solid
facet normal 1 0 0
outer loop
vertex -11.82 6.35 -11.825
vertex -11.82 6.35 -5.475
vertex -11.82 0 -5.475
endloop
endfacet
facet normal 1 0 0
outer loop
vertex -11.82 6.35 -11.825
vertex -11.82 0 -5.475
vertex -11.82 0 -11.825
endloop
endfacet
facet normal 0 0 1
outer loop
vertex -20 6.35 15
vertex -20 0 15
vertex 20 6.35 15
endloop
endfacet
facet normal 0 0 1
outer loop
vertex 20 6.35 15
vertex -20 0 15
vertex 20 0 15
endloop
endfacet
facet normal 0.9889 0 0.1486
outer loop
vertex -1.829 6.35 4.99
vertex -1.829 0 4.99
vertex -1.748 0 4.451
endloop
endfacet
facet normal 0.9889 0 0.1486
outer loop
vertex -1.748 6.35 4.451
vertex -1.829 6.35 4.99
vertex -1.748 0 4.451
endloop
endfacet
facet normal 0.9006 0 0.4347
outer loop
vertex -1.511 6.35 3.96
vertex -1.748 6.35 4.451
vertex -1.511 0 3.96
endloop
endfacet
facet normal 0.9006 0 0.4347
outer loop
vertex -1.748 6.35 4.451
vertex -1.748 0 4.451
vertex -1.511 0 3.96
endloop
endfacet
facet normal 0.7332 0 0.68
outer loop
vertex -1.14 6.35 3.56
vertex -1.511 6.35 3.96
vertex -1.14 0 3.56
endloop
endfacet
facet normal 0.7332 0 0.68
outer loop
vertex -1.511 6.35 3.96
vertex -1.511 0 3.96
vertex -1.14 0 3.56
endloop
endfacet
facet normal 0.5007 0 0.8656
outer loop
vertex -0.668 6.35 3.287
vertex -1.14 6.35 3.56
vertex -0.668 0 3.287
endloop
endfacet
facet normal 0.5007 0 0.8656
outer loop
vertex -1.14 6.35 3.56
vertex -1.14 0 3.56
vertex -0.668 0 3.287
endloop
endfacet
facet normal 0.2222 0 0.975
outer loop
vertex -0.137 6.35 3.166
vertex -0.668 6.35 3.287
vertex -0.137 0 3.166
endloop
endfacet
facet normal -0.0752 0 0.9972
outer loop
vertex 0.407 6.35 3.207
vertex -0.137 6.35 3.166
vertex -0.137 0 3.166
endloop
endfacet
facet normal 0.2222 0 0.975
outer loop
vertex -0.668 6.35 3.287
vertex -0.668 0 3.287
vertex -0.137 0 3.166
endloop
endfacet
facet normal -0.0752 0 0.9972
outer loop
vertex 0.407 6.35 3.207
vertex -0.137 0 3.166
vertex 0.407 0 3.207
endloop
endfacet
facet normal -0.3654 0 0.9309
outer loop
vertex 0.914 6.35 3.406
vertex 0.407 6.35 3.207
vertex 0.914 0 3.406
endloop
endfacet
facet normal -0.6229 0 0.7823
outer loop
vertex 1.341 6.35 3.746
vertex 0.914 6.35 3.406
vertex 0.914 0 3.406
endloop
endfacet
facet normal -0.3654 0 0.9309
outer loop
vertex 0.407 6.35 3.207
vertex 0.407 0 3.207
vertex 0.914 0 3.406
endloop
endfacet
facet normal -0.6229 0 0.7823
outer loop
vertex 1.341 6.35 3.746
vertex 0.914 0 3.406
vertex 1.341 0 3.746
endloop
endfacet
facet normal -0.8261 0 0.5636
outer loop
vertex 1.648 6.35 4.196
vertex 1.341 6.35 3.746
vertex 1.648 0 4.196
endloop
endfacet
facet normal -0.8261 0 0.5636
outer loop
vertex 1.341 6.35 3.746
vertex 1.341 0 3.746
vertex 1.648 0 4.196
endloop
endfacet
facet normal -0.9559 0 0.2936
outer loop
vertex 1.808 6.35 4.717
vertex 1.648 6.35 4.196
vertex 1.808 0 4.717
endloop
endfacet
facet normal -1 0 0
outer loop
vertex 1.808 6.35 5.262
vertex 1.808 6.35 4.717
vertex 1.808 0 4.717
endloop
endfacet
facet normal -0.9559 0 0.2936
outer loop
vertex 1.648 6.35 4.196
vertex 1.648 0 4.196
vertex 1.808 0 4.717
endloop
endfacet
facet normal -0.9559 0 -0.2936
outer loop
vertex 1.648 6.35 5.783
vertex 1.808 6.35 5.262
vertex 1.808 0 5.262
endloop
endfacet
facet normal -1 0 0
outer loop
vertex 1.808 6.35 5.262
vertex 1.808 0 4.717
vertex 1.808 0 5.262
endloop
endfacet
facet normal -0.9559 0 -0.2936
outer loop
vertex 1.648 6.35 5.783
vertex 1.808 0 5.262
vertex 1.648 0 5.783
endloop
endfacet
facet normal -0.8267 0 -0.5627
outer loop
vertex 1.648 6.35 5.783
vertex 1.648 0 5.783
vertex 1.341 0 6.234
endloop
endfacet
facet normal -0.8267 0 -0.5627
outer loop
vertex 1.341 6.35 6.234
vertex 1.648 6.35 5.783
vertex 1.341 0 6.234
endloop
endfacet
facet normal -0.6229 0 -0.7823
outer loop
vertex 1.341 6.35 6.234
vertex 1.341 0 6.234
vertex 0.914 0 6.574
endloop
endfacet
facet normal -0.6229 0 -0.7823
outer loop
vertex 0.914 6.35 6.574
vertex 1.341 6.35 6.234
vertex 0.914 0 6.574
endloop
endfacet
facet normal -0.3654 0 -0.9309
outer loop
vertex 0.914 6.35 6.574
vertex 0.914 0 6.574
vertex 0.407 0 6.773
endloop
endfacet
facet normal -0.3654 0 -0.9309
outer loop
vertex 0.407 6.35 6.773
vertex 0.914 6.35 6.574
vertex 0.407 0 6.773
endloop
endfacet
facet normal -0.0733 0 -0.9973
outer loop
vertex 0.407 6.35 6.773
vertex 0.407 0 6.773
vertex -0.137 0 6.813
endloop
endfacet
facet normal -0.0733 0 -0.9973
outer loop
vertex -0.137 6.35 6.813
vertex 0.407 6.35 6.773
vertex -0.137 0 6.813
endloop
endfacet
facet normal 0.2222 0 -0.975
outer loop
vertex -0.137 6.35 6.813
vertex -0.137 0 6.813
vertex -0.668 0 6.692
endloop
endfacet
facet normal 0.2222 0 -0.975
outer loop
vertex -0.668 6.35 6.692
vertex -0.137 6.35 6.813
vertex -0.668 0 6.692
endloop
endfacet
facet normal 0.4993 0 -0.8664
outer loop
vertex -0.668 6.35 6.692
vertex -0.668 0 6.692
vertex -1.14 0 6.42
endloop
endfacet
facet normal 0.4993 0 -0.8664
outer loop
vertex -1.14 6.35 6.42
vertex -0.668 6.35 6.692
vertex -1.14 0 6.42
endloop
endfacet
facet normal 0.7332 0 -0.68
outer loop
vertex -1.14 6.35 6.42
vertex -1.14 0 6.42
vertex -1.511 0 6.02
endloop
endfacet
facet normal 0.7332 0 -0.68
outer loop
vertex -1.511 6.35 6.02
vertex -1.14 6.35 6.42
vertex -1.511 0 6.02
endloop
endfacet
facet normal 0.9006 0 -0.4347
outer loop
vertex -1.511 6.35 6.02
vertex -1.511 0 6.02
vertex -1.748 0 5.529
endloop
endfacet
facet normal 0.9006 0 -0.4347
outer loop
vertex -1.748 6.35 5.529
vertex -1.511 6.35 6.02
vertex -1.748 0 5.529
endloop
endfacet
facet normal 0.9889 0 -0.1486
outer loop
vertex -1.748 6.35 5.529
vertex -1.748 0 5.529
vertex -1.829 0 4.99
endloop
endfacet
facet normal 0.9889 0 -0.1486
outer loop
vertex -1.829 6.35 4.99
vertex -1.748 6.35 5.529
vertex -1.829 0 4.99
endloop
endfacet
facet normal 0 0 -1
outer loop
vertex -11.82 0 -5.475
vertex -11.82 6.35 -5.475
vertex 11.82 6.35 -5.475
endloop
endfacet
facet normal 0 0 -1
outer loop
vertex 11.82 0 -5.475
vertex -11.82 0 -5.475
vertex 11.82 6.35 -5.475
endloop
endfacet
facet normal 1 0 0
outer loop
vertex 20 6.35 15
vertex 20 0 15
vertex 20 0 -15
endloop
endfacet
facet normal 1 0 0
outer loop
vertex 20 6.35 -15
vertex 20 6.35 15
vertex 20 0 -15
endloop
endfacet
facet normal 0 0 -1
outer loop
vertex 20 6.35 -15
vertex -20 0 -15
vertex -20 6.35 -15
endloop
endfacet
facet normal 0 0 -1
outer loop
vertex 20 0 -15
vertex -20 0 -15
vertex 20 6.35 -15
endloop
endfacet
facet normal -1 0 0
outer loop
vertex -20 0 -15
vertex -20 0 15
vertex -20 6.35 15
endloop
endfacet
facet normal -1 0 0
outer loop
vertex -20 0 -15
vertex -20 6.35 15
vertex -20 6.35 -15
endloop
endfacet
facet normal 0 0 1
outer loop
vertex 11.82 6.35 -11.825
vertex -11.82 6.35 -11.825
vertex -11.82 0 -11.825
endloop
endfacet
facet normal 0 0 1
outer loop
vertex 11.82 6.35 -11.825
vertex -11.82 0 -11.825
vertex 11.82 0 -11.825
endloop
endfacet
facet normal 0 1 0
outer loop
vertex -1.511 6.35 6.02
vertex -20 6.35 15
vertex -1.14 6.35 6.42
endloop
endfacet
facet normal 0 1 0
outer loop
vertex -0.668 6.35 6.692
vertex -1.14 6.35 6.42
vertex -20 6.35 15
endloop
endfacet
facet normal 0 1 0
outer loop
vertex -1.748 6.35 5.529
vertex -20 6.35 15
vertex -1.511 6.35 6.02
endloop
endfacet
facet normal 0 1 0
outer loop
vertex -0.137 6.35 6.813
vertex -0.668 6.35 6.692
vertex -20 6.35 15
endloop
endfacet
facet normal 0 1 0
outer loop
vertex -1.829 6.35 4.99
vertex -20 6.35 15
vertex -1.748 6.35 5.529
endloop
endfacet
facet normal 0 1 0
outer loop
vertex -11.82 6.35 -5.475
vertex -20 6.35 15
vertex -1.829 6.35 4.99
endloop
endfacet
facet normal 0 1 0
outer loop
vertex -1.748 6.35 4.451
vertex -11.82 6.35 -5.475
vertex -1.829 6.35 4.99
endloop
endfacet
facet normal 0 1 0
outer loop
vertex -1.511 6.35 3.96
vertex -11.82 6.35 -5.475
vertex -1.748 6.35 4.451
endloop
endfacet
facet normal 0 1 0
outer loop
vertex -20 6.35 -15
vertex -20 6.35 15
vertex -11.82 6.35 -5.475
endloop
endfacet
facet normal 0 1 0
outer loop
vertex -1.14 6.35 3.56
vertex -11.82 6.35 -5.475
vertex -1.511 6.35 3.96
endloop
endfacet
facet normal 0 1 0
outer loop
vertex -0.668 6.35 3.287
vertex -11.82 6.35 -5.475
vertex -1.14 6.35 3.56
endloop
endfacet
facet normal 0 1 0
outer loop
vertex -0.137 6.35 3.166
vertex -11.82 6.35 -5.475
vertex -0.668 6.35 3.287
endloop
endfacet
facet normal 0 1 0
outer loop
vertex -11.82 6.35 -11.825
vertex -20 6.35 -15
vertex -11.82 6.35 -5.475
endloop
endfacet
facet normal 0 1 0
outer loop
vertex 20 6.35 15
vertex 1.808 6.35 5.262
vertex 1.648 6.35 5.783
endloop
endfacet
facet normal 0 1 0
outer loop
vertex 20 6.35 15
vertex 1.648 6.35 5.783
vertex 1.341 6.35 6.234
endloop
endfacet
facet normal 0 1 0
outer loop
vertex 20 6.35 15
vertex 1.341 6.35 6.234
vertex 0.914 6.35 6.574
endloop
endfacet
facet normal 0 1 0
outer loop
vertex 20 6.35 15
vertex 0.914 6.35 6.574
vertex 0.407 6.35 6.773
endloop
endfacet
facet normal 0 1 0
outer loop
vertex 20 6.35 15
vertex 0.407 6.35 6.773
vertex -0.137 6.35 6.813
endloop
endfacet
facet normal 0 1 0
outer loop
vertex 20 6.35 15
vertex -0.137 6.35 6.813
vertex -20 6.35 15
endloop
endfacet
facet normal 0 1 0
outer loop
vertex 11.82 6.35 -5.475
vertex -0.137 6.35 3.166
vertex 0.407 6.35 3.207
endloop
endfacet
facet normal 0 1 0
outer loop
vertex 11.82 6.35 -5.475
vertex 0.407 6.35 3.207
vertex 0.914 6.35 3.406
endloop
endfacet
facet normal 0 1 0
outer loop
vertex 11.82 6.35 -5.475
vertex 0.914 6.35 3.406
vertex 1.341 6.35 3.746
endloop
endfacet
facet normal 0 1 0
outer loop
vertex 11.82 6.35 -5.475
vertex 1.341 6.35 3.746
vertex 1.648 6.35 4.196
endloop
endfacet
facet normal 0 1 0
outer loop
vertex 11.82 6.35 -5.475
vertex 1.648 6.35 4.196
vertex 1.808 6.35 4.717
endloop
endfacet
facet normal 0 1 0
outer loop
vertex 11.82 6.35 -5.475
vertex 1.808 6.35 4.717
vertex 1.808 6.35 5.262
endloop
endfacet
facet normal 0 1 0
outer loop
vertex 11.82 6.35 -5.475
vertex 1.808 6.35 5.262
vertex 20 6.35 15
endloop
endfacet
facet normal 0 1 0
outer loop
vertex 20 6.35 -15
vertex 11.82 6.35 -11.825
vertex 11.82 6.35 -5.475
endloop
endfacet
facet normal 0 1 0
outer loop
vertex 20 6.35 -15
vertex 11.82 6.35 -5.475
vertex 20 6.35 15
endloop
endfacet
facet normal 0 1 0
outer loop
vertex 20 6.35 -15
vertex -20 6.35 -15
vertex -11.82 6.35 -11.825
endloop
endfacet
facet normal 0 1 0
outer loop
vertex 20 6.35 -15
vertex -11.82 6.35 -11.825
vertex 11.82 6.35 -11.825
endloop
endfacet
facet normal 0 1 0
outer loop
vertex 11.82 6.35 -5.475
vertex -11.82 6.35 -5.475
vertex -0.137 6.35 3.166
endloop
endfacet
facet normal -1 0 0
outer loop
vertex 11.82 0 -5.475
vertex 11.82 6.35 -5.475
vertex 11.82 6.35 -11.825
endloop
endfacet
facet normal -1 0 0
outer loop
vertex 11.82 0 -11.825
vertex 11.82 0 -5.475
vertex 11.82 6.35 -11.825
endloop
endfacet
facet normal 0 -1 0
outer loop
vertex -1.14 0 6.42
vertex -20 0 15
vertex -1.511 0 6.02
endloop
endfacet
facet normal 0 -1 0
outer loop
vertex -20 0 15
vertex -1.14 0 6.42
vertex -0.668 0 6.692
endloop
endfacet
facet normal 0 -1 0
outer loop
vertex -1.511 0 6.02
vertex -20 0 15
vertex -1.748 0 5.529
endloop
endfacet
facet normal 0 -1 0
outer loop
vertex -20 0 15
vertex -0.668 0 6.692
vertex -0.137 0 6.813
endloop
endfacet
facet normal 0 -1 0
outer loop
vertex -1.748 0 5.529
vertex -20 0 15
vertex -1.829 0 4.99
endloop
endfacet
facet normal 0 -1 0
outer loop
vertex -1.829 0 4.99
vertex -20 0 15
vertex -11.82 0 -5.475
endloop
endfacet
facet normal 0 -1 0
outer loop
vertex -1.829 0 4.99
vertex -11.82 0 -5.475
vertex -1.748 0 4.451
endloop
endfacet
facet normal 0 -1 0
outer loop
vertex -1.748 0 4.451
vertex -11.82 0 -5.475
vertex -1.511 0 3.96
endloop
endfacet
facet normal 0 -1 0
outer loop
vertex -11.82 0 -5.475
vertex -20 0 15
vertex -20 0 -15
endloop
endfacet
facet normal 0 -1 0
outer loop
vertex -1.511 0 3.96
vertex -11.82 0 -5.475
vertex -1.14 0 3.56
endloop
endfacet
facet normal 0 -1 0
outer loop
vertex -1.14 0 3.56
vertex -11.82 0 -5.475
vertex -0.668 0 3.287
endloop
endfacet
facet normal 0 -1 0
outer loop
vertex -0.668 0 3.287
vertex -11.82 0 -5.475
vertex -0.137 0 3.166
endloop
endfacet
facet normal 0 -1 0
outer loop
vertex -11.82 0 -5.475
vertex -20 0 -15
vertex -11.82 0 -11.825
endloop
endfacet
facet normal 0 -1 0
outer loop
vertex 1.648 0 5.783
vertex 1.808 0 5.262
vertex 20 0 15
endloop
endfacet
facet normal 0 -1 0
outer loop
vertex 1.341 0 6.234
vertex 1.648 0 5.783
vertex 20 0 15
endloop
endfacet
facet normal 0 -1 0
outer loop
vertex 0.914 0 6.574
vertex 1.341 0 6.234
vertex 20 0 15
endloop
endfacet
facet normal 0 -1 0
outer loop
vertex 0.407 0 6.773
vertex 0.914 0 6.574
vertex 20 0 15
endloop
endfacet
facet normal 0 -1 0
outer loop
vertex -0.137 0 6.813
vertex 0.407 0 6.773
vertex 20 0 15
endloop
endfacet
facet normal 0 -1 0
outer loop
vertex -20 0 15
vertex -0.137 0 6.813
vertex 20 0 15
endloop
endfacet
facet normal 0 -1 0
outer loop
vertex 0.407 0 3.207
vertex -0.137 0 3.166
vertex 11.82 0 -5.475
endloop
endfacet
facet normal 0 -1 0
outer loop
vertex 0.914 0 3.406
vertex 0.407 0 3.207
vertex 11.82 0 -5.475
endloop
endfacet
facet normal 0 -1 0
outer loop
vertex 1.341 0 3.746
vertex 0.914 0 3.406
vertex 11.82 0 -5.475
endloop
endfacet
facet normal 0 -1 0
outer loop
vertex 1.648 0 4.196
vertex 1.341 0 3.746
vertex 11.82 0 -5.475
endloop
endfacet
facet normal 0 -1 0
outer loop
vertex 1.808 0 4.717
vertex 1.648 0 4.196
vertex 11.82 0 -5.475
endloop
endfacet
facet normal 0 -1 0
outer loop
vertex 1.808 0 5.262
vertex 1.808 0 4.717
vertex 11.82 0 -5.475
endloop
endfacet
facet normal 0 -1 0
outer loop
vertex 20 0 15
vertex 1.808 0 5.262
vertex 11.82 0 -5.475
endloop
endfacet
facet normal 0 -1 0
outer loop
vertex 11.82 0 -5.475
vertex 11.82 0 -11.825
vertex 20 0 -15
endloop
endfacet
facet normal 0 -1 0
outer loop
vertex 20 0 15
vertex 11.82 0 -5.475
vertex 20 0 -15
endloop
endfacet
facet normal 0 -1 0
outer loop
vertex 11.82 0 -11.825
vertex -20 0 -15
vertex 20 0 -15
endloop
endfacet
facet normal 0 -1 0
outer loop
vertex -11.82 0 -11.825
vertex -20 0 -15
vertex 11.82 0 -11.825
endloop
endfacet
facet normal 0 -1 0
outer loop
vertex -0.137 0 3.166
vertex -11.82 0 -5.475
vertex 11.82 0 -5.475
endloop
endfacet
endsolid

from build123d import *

# Parameters (mm, degrees)
SKETCH1_W             = 40
SKETCH1_H             = 30
BOSS_EXTRUDE1_DEPTH   = 6.35
SKETCH2_W             = 23.64
SKETCH2_H             = 6.35
CUT_EXTRUDE1_DEPTH    = 7.35
F_6_CLEARANCE_HOLE1_D = 3.6576


with BuildPart() as part:
    # Sketch1 → Boss-Extrude1 (new body)
    with BuildSketch(Plane(origin=(0, 0, 0), x_dir=(1, 0, 0), z_dir=(0, 1, 0))):
        Rectangle(SKETCH1_W, SKETCH1_H)
    extrude(amount=BOSS_EXTRUDE1_DEPTH)

    # Sketch2 → Cut-Extrude1 (cut, through all)
    with BuildSketch(Plane(origin=(0, 6.35, 0), x_dir=(1, 0, 0), z_dir=(0, 1, 0))):
        with Locations((0, 8.65)):
            Rectangle(SKETCH2_W, SKETCH2_H)
    extrude(amount=-CUT_EXTRUDE1_DEPTH, mode=Mode.SUBTRACT)

    # #6 Clearance Hole1 (through all)
    with Locations(Plane(origin=(0, 6.35, 0), x_dir=(1, 0, 0), z_dir=(0, 1, 0))):
        with Locations((0, -4.9898)):
            Hole(F_6_CLEARANCE_HOLE1_D / 2)


solid = part.part
